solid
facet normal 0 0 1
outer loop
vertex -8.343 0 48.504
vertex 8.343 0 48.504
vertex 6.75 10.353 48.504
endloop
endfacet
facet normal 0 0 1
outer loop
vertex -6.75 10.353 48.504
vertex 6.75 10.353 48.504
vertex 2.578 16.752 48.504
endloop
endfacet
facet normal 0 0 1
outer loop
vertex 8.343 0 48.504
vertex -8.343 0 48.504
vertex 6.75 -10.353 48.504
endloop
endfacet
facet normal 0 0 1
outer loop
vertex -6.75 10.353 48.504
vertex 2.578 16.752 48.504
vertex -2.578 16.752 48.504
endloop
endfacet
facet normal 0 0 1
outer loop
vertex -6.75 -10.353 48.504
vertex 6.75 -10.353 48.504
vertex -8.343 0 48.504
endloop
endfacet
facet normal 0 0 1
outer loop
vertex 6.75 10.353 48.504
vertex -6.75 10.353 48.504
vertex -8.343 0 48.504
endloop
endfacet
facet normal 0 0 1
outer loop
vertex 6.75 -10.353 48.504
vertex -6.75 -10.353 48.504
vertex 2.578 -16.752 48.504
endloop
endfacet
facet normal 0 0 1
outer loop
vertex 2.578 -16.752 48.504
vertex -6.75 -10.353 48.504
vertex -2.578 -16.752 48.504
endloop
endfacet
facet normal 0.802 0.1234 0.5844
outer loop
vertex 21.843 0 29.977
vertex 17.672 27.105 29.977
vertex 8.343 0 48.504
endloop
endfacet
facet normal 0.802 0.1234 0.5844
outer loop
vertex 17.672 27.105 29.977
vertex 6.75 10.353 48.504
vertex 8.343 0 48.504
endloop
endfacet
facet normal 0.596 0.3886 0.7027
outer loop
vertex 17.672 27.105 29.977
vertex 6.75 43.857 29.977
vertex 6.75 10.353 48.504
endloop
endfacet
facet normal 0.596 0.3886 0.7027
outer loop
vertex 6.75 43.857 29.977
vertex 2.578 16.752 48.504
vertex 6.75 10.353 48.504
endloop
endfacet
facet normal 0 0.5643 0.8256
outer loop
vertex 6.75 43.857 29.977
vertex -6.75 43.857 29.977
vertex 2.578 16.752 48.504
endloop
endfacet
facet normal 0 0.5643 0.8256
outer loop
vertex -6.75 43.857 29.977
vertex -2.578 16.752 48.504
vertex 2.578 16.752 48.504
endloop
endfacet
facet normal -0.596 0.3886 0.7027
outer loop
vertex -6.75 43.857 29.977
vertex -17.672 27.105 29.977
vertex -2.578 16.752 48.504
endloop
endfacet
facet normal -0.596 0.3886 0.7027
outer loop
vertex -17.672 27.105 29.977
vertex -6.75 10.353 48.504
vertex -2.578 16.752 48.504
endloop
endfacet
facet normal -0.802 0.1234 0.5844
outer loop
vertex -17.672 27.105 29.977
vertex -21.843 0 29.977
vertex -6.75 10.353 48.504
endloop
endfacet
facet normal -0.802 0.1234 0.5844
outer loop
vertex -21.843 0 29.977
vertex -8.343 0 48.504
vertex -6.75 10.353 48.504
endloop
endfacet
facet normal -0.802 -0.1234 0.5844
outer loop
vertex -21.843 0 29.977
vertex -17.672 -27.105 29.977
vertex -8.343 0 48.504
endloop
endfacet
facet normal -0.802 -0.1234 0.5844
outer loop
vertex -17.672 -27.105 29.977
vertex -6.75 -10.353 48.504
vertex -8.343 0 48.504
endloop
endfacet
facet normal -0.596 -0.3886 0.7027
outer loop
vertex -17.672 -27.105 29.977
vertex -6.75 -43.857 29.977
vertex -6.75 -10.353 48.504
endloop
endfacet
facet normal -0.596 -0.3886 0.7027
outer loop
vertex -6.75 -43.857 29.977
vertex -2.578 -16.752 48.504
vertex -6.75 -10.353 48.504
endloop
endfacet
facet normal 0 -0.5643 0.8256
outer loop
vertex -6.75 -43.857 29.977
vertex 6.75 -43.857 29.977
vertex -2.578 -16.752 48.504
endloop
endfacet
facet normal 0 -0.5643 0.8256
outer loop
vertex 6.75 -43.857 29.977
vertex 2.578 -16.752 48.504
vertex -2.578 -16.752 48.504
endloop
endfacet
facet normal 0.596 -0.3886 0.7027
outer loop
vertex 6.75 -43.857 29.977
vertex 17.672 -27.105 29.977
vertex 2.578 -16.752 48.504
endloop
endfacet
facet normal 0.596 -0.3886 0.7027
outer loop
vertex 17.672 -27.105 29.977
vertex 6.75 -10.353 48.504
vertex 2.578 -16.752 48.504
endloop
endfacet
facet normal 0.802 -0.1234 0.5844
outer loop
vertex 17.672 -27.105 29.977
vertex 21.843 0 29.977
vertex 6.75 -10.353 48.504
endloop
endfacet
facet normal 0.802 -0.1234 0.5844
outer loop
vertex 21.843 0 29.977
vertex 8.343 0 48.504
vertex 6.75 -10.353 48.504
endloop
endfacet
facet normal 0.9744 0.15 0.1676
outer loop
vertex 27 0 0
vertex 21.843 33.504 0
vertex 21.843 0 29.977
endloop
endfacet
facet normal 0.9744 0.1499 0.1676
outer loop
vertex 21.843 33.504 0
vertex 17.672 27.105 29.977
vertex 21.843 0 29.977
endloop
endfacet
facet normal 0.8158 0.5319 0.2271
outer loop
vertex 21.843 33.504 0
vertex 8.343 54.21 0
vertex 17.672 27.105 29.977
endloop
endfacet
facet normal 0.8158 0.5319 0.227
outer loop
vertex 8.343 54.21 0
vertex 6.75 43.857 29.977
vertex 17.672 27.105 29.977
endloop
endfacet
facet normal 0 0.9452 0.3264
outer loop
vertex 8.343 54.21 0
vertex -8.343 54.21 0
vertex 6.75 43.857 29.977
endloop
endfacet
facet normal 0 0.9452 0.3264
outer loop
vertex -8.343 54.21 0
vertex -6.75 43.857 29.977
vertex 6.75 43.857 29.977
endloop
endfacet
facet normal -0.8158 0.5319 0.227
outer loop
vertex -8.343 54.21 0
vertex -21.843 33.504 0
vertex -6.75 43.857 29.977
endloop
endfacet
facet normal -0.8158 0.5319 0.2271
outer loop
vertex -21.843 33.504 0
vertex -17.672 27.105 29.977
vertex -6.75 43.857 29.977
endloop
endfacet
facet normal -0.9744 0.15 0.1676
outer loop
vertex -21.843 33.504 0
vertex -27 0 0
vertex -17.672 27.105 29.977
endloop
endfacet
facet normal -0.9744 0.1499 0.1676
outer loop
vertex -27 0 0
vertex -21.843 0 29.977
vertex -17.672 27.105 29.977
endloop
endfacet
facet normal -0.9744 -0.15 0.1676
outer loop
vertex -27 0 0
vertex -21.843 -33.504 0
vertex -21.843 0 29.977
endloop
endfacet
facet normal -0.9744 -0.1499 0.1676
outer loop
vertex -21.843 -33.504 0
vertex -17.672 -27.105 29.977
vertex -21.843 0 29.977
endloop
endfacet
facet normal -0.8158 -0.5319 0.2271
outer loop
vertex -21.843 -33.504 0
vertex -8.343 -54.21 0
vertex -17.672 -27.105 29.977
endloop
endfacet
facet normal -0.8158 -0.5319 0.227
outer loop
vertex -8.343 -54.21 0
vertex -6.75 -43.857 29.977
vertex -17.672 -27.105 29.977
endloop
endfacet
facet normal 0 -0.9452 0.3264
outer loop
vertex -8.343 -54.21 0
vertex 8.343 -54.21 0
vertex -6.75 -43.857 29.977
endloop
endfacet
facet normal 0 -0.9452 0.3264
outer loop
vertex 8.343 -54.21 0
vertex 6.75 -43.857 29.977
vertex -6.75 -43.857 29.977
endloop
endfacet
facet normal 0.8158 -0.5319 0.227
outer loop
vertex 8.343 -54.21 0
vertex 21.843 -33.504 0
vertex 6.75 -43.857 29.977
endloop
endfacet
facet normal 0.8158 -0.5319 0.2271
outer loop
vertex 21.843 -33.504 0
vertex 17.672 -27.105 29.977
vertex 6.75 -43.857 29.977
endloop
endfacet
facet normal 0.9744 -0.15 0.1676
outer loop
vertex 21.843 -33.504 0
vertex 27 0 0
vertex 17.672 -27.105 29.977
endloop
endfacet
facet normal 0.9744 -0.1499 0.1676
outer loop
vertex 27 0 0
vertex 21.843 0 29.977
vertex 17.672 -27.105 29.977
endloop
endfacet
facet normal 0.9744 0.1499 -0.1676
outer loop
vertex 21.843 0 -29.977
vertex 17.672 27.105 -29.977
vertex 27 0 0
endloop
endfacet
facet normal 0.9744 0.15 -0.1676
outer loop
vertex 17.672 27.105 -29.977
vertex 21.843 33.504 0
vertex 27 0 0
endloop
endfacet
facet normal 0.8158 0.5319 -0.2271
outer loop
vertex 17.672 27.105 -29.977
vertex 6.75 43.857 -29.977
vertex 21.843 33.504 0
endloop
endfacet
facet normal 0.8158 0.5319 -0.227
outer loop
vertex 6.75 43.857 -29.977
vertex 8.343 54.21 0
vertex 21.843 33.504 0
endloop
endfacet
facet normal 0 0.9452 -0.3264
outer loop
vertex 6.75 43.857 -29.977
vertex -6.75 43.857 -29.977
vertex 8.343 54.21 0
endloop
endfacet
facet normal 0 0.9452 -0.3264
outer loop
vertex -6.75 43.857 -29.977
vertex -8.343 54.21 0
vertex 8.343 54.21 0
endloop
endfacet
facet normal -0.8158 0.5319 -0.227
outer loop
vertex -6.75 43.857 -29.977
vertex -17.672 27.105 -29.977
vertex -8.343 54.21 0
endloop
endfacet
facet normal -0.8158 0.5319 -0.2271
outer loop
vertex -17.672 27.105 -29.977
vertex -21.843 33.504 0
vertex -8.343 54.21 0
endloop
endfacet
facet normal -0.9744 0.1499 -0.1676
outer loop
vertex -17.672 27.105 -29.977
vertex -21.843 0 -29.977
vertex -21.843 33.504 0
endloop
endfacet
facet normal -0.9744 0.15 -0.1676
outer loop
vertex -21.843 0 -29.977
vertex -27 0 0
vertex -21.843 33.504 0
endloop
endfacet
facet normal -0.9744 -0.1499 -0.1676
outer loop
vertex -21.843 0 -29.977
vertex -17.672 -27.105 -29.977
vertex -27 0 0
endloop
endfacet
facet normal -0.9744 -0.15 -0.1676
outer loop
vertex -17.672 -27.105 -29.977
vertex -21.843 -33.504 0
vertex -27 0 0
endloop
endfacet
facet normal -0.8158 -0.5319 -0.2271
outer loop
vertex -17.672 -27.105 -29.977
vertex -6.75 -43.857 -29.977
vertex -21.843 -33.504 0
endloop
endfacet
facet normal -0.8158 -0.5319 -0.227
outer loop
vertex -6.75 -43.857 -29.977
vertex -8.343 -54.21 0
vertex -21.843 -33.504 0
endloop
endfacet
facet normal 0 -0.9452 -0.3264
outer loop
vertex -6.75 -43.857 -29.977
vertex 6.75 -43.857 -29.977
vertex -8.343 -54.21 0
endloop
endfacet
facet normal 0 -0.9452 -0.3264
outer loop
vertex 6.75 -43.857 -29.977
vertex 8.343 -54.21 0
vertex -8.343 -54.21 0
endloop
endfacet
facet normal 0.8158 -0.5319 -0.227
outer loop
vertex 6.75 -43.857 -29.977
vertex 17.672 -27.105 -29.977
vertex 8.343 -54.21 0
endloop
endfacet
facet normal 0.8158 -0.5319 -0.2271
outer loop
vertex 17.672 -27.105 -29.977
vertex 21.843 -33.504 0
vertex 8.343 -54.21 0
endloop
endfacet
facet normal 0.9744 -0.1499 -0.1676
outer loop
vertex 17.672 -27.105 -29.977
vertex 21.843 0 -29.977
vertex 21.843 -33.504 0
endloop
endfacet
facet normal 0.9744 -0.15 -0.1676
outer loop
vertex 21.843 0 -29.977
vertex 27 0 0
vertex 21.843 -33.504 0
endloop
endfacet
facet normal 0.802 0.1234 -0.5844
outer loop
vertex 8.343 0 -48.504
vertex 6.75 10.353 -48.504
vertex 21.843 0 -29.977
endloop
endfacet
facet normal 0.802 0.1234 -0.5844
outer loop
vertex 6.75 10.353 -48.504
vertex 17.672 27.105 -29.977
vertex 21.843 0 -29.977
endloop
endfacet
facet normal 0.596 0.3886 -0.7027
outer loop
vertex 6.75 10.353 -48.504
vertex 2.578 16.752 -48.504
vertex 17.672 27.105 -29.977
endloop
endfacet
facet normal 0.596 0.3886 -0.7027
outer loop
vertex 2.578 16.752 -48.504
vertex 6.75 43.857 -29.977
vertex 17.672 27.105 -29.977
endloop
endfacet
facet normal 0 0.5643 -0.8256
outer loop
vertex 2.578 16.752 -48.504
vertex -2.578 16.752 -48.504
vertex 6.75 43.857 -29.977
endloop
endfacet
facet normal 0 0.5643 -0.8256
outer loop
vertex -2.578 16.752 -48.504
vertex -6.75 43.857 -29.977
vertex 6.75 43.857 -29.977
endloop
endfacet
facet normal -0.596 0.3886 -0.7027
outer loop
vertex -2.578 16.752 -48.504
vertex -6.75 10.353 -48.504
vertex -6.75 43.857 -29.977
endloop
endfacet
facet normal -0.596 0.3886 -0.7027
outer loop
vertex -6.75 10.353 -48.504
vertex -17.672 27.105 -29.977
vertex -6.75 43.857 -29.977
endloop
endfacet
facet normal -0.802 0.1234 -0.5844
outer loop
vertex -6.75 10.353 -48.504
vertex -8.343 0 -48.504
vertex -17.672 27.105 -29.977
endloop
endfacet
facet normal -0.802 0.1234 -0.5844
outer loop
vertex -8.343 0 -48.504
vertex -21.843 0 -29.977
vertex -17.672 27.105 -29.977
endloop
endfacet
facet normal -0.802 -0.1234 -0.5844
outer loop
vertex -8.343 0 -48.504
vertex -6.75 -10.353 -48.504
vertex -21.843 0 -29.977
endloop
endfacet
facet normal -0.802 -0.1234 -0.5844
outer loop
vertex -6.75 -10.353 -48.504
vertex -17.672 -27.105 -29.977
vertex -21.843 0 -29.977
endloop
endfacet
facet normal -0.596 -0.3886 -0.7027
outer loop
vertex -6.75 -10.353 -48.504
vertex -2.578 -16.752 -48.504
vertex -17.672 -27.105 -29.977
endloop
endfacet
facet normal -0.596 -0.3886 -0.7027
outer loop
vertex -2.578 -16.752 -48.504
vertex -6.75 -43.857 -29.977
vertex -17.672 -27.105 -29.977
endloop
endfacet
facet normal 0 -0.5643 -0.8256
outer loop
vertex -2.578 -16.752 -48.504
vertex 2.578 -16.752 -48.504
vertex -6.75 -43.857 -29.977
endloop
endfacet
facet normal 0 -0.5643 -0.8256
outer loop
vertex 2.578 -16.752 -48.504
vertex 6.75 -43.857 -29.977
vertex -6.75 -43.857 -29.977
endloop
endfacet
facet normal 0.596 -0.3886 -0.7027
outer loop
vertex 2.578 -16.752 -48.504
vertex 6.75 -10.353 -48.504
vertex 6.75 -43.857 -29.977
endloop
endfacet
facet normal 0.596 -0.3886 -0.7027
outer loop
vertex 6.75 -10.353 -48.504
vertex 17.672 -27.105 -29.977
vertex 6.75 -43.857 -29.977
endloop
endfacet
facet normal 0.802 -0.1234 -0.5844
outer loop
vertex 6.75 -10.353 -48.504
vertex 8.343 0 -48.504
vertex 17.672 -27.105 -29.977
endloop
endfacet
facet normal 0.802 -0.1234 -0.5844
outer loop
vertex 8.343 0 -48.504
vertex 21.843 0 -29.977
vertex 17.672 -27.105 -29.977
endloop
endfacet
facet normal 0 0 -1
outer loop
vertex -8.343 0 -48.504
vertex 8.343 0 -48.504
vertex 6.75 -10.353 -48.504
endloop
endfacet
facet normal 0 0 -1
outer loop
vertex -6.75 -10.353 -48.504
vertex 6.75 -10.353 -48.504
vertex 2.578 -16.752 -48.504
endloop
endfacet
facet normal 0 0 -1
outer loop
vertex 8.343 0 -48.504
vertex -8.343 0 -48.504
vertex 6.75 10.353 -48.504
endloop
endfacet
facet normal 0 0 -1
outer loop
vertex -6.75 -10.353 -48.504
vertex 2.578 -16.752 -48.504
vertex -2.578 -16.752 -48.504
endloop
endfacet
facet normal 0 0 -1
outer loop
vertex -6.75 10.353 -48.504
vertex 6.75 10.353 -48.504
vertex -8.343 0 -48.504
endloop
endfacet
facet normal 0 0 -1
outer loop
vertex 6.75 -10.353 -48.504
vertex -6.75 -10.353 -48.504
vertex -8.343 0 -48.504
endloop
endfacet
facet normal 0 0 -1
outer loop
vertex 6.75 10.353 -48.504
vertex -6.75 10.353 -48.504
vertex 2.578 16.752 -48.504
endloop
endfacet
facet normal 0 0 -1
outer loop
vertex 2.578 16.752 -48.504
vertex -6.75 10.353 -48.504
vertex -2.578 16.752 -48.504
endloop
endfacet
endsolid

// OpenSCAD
// Generated by SolidPython 1.0.1 on 2020-07-29 00:46:49


scale(v = [9, 19, 17]) {
	sphere(r = 3);
}
/***********************************************
*********      SolidPython code:      **********
************************************************
 
# import packages: SolidPython
from solid import *
from solid.utils import *
from itertools import chain, combinations, permutations


class Resize:

    def __init__(self, scad_file):
        self.scad_file = scad_file
        #self.scad_file = import_scad(scad_file)
        # cone/cylinder param:
        self.r1 = 0
        self.r2 = 0
        self.h = 0
        # rectangular prism param:
        self.w = 0
        self.l = 0
        # ellipse param:
        self.r = 0

    # import OpenScad code (file name corresponds to shape)


    # classify shape + parameters
    def assign(self, param1, param2, param3):
        if self.scad_file == 'cone.scad':
            self.r1 = param1
            self.r2 = param2
            self.h = param3
        elif self.scad_file == 'cylinder.scad':
            self.r1 = param1
            self.r2 = param2
            self.h = param3
        elif self.scad_file == 'rectangularPrism.scad':
            self.h = param1
            self.l = param2
            self.w = param3
        else:
            self.r = param1
            self.h = param2

    # resize parameters
    def iterate(self):
        x = range(3, 20, 2)
        i = 1
        if self.scad_file == 'cone.scad':
            tempList = list(permutations(x, 2))
            for temp in tempList:
                param1 = temp[0]
                param2 = temp[1]
                filepath = 'produced_scad_files/' + 'cone' + str(param1) + '_' + str(param2) + '_' + '.scad'
                scad_render_to_file(cylinder(h=param1, r1=param2, r2=0), filepath)

        elif self.scad_file == 'cylinder.scad':
            tempList = list(permutations(x, 3))
            for temp in tempList:
                param1 = temp[0]
                param2 = temp[1]
                filepath = 'produced_scad_files/' + 'cylinder' + str(param1) + '_' + str(param2) + '_' + '.scad'
                scad_render_to_file(cylinder(h=param1, r1=param2, r2=param2), filepath)

        elif self.scad_file == 'rectangularPrism.scad':
            tempList = list(permutations(x, 3))
            for temp in tempList:
                param1 = temp[0]
                param2 = temp[1]
                param3 = temp[2]
                filepath = 'produced_scad_files/' + 'rectangularPrism' + str(param1) + '_' + str(param2) + '_' + str(
                    param3) + '.scad'
                scad_render_to_file(cube(size=(param1, param2, param3)), filepath)

        elif self.scad_file == 'ellipse.scad':
            tempList = list(permutations(x, 4))
            for temp in tempList:
                param1 = temp[0]
                param2 = temp[1]
                param3 = temp[2]
                param4 = temp[3]
                filepath = 'produced_scad_files/' + 'ellipse' + str(param1) + '_' + str(param2) + '_' + str(param3) + '_' + str(param4) + '.scad'
                scad_render_to_file(scale([param1, param2, param3])(sphere(r=param4)), filepath)

    def render_to_scadfile(self):
        scad_render_to_file(scad, 'example.scad') 
 
************************************************/
